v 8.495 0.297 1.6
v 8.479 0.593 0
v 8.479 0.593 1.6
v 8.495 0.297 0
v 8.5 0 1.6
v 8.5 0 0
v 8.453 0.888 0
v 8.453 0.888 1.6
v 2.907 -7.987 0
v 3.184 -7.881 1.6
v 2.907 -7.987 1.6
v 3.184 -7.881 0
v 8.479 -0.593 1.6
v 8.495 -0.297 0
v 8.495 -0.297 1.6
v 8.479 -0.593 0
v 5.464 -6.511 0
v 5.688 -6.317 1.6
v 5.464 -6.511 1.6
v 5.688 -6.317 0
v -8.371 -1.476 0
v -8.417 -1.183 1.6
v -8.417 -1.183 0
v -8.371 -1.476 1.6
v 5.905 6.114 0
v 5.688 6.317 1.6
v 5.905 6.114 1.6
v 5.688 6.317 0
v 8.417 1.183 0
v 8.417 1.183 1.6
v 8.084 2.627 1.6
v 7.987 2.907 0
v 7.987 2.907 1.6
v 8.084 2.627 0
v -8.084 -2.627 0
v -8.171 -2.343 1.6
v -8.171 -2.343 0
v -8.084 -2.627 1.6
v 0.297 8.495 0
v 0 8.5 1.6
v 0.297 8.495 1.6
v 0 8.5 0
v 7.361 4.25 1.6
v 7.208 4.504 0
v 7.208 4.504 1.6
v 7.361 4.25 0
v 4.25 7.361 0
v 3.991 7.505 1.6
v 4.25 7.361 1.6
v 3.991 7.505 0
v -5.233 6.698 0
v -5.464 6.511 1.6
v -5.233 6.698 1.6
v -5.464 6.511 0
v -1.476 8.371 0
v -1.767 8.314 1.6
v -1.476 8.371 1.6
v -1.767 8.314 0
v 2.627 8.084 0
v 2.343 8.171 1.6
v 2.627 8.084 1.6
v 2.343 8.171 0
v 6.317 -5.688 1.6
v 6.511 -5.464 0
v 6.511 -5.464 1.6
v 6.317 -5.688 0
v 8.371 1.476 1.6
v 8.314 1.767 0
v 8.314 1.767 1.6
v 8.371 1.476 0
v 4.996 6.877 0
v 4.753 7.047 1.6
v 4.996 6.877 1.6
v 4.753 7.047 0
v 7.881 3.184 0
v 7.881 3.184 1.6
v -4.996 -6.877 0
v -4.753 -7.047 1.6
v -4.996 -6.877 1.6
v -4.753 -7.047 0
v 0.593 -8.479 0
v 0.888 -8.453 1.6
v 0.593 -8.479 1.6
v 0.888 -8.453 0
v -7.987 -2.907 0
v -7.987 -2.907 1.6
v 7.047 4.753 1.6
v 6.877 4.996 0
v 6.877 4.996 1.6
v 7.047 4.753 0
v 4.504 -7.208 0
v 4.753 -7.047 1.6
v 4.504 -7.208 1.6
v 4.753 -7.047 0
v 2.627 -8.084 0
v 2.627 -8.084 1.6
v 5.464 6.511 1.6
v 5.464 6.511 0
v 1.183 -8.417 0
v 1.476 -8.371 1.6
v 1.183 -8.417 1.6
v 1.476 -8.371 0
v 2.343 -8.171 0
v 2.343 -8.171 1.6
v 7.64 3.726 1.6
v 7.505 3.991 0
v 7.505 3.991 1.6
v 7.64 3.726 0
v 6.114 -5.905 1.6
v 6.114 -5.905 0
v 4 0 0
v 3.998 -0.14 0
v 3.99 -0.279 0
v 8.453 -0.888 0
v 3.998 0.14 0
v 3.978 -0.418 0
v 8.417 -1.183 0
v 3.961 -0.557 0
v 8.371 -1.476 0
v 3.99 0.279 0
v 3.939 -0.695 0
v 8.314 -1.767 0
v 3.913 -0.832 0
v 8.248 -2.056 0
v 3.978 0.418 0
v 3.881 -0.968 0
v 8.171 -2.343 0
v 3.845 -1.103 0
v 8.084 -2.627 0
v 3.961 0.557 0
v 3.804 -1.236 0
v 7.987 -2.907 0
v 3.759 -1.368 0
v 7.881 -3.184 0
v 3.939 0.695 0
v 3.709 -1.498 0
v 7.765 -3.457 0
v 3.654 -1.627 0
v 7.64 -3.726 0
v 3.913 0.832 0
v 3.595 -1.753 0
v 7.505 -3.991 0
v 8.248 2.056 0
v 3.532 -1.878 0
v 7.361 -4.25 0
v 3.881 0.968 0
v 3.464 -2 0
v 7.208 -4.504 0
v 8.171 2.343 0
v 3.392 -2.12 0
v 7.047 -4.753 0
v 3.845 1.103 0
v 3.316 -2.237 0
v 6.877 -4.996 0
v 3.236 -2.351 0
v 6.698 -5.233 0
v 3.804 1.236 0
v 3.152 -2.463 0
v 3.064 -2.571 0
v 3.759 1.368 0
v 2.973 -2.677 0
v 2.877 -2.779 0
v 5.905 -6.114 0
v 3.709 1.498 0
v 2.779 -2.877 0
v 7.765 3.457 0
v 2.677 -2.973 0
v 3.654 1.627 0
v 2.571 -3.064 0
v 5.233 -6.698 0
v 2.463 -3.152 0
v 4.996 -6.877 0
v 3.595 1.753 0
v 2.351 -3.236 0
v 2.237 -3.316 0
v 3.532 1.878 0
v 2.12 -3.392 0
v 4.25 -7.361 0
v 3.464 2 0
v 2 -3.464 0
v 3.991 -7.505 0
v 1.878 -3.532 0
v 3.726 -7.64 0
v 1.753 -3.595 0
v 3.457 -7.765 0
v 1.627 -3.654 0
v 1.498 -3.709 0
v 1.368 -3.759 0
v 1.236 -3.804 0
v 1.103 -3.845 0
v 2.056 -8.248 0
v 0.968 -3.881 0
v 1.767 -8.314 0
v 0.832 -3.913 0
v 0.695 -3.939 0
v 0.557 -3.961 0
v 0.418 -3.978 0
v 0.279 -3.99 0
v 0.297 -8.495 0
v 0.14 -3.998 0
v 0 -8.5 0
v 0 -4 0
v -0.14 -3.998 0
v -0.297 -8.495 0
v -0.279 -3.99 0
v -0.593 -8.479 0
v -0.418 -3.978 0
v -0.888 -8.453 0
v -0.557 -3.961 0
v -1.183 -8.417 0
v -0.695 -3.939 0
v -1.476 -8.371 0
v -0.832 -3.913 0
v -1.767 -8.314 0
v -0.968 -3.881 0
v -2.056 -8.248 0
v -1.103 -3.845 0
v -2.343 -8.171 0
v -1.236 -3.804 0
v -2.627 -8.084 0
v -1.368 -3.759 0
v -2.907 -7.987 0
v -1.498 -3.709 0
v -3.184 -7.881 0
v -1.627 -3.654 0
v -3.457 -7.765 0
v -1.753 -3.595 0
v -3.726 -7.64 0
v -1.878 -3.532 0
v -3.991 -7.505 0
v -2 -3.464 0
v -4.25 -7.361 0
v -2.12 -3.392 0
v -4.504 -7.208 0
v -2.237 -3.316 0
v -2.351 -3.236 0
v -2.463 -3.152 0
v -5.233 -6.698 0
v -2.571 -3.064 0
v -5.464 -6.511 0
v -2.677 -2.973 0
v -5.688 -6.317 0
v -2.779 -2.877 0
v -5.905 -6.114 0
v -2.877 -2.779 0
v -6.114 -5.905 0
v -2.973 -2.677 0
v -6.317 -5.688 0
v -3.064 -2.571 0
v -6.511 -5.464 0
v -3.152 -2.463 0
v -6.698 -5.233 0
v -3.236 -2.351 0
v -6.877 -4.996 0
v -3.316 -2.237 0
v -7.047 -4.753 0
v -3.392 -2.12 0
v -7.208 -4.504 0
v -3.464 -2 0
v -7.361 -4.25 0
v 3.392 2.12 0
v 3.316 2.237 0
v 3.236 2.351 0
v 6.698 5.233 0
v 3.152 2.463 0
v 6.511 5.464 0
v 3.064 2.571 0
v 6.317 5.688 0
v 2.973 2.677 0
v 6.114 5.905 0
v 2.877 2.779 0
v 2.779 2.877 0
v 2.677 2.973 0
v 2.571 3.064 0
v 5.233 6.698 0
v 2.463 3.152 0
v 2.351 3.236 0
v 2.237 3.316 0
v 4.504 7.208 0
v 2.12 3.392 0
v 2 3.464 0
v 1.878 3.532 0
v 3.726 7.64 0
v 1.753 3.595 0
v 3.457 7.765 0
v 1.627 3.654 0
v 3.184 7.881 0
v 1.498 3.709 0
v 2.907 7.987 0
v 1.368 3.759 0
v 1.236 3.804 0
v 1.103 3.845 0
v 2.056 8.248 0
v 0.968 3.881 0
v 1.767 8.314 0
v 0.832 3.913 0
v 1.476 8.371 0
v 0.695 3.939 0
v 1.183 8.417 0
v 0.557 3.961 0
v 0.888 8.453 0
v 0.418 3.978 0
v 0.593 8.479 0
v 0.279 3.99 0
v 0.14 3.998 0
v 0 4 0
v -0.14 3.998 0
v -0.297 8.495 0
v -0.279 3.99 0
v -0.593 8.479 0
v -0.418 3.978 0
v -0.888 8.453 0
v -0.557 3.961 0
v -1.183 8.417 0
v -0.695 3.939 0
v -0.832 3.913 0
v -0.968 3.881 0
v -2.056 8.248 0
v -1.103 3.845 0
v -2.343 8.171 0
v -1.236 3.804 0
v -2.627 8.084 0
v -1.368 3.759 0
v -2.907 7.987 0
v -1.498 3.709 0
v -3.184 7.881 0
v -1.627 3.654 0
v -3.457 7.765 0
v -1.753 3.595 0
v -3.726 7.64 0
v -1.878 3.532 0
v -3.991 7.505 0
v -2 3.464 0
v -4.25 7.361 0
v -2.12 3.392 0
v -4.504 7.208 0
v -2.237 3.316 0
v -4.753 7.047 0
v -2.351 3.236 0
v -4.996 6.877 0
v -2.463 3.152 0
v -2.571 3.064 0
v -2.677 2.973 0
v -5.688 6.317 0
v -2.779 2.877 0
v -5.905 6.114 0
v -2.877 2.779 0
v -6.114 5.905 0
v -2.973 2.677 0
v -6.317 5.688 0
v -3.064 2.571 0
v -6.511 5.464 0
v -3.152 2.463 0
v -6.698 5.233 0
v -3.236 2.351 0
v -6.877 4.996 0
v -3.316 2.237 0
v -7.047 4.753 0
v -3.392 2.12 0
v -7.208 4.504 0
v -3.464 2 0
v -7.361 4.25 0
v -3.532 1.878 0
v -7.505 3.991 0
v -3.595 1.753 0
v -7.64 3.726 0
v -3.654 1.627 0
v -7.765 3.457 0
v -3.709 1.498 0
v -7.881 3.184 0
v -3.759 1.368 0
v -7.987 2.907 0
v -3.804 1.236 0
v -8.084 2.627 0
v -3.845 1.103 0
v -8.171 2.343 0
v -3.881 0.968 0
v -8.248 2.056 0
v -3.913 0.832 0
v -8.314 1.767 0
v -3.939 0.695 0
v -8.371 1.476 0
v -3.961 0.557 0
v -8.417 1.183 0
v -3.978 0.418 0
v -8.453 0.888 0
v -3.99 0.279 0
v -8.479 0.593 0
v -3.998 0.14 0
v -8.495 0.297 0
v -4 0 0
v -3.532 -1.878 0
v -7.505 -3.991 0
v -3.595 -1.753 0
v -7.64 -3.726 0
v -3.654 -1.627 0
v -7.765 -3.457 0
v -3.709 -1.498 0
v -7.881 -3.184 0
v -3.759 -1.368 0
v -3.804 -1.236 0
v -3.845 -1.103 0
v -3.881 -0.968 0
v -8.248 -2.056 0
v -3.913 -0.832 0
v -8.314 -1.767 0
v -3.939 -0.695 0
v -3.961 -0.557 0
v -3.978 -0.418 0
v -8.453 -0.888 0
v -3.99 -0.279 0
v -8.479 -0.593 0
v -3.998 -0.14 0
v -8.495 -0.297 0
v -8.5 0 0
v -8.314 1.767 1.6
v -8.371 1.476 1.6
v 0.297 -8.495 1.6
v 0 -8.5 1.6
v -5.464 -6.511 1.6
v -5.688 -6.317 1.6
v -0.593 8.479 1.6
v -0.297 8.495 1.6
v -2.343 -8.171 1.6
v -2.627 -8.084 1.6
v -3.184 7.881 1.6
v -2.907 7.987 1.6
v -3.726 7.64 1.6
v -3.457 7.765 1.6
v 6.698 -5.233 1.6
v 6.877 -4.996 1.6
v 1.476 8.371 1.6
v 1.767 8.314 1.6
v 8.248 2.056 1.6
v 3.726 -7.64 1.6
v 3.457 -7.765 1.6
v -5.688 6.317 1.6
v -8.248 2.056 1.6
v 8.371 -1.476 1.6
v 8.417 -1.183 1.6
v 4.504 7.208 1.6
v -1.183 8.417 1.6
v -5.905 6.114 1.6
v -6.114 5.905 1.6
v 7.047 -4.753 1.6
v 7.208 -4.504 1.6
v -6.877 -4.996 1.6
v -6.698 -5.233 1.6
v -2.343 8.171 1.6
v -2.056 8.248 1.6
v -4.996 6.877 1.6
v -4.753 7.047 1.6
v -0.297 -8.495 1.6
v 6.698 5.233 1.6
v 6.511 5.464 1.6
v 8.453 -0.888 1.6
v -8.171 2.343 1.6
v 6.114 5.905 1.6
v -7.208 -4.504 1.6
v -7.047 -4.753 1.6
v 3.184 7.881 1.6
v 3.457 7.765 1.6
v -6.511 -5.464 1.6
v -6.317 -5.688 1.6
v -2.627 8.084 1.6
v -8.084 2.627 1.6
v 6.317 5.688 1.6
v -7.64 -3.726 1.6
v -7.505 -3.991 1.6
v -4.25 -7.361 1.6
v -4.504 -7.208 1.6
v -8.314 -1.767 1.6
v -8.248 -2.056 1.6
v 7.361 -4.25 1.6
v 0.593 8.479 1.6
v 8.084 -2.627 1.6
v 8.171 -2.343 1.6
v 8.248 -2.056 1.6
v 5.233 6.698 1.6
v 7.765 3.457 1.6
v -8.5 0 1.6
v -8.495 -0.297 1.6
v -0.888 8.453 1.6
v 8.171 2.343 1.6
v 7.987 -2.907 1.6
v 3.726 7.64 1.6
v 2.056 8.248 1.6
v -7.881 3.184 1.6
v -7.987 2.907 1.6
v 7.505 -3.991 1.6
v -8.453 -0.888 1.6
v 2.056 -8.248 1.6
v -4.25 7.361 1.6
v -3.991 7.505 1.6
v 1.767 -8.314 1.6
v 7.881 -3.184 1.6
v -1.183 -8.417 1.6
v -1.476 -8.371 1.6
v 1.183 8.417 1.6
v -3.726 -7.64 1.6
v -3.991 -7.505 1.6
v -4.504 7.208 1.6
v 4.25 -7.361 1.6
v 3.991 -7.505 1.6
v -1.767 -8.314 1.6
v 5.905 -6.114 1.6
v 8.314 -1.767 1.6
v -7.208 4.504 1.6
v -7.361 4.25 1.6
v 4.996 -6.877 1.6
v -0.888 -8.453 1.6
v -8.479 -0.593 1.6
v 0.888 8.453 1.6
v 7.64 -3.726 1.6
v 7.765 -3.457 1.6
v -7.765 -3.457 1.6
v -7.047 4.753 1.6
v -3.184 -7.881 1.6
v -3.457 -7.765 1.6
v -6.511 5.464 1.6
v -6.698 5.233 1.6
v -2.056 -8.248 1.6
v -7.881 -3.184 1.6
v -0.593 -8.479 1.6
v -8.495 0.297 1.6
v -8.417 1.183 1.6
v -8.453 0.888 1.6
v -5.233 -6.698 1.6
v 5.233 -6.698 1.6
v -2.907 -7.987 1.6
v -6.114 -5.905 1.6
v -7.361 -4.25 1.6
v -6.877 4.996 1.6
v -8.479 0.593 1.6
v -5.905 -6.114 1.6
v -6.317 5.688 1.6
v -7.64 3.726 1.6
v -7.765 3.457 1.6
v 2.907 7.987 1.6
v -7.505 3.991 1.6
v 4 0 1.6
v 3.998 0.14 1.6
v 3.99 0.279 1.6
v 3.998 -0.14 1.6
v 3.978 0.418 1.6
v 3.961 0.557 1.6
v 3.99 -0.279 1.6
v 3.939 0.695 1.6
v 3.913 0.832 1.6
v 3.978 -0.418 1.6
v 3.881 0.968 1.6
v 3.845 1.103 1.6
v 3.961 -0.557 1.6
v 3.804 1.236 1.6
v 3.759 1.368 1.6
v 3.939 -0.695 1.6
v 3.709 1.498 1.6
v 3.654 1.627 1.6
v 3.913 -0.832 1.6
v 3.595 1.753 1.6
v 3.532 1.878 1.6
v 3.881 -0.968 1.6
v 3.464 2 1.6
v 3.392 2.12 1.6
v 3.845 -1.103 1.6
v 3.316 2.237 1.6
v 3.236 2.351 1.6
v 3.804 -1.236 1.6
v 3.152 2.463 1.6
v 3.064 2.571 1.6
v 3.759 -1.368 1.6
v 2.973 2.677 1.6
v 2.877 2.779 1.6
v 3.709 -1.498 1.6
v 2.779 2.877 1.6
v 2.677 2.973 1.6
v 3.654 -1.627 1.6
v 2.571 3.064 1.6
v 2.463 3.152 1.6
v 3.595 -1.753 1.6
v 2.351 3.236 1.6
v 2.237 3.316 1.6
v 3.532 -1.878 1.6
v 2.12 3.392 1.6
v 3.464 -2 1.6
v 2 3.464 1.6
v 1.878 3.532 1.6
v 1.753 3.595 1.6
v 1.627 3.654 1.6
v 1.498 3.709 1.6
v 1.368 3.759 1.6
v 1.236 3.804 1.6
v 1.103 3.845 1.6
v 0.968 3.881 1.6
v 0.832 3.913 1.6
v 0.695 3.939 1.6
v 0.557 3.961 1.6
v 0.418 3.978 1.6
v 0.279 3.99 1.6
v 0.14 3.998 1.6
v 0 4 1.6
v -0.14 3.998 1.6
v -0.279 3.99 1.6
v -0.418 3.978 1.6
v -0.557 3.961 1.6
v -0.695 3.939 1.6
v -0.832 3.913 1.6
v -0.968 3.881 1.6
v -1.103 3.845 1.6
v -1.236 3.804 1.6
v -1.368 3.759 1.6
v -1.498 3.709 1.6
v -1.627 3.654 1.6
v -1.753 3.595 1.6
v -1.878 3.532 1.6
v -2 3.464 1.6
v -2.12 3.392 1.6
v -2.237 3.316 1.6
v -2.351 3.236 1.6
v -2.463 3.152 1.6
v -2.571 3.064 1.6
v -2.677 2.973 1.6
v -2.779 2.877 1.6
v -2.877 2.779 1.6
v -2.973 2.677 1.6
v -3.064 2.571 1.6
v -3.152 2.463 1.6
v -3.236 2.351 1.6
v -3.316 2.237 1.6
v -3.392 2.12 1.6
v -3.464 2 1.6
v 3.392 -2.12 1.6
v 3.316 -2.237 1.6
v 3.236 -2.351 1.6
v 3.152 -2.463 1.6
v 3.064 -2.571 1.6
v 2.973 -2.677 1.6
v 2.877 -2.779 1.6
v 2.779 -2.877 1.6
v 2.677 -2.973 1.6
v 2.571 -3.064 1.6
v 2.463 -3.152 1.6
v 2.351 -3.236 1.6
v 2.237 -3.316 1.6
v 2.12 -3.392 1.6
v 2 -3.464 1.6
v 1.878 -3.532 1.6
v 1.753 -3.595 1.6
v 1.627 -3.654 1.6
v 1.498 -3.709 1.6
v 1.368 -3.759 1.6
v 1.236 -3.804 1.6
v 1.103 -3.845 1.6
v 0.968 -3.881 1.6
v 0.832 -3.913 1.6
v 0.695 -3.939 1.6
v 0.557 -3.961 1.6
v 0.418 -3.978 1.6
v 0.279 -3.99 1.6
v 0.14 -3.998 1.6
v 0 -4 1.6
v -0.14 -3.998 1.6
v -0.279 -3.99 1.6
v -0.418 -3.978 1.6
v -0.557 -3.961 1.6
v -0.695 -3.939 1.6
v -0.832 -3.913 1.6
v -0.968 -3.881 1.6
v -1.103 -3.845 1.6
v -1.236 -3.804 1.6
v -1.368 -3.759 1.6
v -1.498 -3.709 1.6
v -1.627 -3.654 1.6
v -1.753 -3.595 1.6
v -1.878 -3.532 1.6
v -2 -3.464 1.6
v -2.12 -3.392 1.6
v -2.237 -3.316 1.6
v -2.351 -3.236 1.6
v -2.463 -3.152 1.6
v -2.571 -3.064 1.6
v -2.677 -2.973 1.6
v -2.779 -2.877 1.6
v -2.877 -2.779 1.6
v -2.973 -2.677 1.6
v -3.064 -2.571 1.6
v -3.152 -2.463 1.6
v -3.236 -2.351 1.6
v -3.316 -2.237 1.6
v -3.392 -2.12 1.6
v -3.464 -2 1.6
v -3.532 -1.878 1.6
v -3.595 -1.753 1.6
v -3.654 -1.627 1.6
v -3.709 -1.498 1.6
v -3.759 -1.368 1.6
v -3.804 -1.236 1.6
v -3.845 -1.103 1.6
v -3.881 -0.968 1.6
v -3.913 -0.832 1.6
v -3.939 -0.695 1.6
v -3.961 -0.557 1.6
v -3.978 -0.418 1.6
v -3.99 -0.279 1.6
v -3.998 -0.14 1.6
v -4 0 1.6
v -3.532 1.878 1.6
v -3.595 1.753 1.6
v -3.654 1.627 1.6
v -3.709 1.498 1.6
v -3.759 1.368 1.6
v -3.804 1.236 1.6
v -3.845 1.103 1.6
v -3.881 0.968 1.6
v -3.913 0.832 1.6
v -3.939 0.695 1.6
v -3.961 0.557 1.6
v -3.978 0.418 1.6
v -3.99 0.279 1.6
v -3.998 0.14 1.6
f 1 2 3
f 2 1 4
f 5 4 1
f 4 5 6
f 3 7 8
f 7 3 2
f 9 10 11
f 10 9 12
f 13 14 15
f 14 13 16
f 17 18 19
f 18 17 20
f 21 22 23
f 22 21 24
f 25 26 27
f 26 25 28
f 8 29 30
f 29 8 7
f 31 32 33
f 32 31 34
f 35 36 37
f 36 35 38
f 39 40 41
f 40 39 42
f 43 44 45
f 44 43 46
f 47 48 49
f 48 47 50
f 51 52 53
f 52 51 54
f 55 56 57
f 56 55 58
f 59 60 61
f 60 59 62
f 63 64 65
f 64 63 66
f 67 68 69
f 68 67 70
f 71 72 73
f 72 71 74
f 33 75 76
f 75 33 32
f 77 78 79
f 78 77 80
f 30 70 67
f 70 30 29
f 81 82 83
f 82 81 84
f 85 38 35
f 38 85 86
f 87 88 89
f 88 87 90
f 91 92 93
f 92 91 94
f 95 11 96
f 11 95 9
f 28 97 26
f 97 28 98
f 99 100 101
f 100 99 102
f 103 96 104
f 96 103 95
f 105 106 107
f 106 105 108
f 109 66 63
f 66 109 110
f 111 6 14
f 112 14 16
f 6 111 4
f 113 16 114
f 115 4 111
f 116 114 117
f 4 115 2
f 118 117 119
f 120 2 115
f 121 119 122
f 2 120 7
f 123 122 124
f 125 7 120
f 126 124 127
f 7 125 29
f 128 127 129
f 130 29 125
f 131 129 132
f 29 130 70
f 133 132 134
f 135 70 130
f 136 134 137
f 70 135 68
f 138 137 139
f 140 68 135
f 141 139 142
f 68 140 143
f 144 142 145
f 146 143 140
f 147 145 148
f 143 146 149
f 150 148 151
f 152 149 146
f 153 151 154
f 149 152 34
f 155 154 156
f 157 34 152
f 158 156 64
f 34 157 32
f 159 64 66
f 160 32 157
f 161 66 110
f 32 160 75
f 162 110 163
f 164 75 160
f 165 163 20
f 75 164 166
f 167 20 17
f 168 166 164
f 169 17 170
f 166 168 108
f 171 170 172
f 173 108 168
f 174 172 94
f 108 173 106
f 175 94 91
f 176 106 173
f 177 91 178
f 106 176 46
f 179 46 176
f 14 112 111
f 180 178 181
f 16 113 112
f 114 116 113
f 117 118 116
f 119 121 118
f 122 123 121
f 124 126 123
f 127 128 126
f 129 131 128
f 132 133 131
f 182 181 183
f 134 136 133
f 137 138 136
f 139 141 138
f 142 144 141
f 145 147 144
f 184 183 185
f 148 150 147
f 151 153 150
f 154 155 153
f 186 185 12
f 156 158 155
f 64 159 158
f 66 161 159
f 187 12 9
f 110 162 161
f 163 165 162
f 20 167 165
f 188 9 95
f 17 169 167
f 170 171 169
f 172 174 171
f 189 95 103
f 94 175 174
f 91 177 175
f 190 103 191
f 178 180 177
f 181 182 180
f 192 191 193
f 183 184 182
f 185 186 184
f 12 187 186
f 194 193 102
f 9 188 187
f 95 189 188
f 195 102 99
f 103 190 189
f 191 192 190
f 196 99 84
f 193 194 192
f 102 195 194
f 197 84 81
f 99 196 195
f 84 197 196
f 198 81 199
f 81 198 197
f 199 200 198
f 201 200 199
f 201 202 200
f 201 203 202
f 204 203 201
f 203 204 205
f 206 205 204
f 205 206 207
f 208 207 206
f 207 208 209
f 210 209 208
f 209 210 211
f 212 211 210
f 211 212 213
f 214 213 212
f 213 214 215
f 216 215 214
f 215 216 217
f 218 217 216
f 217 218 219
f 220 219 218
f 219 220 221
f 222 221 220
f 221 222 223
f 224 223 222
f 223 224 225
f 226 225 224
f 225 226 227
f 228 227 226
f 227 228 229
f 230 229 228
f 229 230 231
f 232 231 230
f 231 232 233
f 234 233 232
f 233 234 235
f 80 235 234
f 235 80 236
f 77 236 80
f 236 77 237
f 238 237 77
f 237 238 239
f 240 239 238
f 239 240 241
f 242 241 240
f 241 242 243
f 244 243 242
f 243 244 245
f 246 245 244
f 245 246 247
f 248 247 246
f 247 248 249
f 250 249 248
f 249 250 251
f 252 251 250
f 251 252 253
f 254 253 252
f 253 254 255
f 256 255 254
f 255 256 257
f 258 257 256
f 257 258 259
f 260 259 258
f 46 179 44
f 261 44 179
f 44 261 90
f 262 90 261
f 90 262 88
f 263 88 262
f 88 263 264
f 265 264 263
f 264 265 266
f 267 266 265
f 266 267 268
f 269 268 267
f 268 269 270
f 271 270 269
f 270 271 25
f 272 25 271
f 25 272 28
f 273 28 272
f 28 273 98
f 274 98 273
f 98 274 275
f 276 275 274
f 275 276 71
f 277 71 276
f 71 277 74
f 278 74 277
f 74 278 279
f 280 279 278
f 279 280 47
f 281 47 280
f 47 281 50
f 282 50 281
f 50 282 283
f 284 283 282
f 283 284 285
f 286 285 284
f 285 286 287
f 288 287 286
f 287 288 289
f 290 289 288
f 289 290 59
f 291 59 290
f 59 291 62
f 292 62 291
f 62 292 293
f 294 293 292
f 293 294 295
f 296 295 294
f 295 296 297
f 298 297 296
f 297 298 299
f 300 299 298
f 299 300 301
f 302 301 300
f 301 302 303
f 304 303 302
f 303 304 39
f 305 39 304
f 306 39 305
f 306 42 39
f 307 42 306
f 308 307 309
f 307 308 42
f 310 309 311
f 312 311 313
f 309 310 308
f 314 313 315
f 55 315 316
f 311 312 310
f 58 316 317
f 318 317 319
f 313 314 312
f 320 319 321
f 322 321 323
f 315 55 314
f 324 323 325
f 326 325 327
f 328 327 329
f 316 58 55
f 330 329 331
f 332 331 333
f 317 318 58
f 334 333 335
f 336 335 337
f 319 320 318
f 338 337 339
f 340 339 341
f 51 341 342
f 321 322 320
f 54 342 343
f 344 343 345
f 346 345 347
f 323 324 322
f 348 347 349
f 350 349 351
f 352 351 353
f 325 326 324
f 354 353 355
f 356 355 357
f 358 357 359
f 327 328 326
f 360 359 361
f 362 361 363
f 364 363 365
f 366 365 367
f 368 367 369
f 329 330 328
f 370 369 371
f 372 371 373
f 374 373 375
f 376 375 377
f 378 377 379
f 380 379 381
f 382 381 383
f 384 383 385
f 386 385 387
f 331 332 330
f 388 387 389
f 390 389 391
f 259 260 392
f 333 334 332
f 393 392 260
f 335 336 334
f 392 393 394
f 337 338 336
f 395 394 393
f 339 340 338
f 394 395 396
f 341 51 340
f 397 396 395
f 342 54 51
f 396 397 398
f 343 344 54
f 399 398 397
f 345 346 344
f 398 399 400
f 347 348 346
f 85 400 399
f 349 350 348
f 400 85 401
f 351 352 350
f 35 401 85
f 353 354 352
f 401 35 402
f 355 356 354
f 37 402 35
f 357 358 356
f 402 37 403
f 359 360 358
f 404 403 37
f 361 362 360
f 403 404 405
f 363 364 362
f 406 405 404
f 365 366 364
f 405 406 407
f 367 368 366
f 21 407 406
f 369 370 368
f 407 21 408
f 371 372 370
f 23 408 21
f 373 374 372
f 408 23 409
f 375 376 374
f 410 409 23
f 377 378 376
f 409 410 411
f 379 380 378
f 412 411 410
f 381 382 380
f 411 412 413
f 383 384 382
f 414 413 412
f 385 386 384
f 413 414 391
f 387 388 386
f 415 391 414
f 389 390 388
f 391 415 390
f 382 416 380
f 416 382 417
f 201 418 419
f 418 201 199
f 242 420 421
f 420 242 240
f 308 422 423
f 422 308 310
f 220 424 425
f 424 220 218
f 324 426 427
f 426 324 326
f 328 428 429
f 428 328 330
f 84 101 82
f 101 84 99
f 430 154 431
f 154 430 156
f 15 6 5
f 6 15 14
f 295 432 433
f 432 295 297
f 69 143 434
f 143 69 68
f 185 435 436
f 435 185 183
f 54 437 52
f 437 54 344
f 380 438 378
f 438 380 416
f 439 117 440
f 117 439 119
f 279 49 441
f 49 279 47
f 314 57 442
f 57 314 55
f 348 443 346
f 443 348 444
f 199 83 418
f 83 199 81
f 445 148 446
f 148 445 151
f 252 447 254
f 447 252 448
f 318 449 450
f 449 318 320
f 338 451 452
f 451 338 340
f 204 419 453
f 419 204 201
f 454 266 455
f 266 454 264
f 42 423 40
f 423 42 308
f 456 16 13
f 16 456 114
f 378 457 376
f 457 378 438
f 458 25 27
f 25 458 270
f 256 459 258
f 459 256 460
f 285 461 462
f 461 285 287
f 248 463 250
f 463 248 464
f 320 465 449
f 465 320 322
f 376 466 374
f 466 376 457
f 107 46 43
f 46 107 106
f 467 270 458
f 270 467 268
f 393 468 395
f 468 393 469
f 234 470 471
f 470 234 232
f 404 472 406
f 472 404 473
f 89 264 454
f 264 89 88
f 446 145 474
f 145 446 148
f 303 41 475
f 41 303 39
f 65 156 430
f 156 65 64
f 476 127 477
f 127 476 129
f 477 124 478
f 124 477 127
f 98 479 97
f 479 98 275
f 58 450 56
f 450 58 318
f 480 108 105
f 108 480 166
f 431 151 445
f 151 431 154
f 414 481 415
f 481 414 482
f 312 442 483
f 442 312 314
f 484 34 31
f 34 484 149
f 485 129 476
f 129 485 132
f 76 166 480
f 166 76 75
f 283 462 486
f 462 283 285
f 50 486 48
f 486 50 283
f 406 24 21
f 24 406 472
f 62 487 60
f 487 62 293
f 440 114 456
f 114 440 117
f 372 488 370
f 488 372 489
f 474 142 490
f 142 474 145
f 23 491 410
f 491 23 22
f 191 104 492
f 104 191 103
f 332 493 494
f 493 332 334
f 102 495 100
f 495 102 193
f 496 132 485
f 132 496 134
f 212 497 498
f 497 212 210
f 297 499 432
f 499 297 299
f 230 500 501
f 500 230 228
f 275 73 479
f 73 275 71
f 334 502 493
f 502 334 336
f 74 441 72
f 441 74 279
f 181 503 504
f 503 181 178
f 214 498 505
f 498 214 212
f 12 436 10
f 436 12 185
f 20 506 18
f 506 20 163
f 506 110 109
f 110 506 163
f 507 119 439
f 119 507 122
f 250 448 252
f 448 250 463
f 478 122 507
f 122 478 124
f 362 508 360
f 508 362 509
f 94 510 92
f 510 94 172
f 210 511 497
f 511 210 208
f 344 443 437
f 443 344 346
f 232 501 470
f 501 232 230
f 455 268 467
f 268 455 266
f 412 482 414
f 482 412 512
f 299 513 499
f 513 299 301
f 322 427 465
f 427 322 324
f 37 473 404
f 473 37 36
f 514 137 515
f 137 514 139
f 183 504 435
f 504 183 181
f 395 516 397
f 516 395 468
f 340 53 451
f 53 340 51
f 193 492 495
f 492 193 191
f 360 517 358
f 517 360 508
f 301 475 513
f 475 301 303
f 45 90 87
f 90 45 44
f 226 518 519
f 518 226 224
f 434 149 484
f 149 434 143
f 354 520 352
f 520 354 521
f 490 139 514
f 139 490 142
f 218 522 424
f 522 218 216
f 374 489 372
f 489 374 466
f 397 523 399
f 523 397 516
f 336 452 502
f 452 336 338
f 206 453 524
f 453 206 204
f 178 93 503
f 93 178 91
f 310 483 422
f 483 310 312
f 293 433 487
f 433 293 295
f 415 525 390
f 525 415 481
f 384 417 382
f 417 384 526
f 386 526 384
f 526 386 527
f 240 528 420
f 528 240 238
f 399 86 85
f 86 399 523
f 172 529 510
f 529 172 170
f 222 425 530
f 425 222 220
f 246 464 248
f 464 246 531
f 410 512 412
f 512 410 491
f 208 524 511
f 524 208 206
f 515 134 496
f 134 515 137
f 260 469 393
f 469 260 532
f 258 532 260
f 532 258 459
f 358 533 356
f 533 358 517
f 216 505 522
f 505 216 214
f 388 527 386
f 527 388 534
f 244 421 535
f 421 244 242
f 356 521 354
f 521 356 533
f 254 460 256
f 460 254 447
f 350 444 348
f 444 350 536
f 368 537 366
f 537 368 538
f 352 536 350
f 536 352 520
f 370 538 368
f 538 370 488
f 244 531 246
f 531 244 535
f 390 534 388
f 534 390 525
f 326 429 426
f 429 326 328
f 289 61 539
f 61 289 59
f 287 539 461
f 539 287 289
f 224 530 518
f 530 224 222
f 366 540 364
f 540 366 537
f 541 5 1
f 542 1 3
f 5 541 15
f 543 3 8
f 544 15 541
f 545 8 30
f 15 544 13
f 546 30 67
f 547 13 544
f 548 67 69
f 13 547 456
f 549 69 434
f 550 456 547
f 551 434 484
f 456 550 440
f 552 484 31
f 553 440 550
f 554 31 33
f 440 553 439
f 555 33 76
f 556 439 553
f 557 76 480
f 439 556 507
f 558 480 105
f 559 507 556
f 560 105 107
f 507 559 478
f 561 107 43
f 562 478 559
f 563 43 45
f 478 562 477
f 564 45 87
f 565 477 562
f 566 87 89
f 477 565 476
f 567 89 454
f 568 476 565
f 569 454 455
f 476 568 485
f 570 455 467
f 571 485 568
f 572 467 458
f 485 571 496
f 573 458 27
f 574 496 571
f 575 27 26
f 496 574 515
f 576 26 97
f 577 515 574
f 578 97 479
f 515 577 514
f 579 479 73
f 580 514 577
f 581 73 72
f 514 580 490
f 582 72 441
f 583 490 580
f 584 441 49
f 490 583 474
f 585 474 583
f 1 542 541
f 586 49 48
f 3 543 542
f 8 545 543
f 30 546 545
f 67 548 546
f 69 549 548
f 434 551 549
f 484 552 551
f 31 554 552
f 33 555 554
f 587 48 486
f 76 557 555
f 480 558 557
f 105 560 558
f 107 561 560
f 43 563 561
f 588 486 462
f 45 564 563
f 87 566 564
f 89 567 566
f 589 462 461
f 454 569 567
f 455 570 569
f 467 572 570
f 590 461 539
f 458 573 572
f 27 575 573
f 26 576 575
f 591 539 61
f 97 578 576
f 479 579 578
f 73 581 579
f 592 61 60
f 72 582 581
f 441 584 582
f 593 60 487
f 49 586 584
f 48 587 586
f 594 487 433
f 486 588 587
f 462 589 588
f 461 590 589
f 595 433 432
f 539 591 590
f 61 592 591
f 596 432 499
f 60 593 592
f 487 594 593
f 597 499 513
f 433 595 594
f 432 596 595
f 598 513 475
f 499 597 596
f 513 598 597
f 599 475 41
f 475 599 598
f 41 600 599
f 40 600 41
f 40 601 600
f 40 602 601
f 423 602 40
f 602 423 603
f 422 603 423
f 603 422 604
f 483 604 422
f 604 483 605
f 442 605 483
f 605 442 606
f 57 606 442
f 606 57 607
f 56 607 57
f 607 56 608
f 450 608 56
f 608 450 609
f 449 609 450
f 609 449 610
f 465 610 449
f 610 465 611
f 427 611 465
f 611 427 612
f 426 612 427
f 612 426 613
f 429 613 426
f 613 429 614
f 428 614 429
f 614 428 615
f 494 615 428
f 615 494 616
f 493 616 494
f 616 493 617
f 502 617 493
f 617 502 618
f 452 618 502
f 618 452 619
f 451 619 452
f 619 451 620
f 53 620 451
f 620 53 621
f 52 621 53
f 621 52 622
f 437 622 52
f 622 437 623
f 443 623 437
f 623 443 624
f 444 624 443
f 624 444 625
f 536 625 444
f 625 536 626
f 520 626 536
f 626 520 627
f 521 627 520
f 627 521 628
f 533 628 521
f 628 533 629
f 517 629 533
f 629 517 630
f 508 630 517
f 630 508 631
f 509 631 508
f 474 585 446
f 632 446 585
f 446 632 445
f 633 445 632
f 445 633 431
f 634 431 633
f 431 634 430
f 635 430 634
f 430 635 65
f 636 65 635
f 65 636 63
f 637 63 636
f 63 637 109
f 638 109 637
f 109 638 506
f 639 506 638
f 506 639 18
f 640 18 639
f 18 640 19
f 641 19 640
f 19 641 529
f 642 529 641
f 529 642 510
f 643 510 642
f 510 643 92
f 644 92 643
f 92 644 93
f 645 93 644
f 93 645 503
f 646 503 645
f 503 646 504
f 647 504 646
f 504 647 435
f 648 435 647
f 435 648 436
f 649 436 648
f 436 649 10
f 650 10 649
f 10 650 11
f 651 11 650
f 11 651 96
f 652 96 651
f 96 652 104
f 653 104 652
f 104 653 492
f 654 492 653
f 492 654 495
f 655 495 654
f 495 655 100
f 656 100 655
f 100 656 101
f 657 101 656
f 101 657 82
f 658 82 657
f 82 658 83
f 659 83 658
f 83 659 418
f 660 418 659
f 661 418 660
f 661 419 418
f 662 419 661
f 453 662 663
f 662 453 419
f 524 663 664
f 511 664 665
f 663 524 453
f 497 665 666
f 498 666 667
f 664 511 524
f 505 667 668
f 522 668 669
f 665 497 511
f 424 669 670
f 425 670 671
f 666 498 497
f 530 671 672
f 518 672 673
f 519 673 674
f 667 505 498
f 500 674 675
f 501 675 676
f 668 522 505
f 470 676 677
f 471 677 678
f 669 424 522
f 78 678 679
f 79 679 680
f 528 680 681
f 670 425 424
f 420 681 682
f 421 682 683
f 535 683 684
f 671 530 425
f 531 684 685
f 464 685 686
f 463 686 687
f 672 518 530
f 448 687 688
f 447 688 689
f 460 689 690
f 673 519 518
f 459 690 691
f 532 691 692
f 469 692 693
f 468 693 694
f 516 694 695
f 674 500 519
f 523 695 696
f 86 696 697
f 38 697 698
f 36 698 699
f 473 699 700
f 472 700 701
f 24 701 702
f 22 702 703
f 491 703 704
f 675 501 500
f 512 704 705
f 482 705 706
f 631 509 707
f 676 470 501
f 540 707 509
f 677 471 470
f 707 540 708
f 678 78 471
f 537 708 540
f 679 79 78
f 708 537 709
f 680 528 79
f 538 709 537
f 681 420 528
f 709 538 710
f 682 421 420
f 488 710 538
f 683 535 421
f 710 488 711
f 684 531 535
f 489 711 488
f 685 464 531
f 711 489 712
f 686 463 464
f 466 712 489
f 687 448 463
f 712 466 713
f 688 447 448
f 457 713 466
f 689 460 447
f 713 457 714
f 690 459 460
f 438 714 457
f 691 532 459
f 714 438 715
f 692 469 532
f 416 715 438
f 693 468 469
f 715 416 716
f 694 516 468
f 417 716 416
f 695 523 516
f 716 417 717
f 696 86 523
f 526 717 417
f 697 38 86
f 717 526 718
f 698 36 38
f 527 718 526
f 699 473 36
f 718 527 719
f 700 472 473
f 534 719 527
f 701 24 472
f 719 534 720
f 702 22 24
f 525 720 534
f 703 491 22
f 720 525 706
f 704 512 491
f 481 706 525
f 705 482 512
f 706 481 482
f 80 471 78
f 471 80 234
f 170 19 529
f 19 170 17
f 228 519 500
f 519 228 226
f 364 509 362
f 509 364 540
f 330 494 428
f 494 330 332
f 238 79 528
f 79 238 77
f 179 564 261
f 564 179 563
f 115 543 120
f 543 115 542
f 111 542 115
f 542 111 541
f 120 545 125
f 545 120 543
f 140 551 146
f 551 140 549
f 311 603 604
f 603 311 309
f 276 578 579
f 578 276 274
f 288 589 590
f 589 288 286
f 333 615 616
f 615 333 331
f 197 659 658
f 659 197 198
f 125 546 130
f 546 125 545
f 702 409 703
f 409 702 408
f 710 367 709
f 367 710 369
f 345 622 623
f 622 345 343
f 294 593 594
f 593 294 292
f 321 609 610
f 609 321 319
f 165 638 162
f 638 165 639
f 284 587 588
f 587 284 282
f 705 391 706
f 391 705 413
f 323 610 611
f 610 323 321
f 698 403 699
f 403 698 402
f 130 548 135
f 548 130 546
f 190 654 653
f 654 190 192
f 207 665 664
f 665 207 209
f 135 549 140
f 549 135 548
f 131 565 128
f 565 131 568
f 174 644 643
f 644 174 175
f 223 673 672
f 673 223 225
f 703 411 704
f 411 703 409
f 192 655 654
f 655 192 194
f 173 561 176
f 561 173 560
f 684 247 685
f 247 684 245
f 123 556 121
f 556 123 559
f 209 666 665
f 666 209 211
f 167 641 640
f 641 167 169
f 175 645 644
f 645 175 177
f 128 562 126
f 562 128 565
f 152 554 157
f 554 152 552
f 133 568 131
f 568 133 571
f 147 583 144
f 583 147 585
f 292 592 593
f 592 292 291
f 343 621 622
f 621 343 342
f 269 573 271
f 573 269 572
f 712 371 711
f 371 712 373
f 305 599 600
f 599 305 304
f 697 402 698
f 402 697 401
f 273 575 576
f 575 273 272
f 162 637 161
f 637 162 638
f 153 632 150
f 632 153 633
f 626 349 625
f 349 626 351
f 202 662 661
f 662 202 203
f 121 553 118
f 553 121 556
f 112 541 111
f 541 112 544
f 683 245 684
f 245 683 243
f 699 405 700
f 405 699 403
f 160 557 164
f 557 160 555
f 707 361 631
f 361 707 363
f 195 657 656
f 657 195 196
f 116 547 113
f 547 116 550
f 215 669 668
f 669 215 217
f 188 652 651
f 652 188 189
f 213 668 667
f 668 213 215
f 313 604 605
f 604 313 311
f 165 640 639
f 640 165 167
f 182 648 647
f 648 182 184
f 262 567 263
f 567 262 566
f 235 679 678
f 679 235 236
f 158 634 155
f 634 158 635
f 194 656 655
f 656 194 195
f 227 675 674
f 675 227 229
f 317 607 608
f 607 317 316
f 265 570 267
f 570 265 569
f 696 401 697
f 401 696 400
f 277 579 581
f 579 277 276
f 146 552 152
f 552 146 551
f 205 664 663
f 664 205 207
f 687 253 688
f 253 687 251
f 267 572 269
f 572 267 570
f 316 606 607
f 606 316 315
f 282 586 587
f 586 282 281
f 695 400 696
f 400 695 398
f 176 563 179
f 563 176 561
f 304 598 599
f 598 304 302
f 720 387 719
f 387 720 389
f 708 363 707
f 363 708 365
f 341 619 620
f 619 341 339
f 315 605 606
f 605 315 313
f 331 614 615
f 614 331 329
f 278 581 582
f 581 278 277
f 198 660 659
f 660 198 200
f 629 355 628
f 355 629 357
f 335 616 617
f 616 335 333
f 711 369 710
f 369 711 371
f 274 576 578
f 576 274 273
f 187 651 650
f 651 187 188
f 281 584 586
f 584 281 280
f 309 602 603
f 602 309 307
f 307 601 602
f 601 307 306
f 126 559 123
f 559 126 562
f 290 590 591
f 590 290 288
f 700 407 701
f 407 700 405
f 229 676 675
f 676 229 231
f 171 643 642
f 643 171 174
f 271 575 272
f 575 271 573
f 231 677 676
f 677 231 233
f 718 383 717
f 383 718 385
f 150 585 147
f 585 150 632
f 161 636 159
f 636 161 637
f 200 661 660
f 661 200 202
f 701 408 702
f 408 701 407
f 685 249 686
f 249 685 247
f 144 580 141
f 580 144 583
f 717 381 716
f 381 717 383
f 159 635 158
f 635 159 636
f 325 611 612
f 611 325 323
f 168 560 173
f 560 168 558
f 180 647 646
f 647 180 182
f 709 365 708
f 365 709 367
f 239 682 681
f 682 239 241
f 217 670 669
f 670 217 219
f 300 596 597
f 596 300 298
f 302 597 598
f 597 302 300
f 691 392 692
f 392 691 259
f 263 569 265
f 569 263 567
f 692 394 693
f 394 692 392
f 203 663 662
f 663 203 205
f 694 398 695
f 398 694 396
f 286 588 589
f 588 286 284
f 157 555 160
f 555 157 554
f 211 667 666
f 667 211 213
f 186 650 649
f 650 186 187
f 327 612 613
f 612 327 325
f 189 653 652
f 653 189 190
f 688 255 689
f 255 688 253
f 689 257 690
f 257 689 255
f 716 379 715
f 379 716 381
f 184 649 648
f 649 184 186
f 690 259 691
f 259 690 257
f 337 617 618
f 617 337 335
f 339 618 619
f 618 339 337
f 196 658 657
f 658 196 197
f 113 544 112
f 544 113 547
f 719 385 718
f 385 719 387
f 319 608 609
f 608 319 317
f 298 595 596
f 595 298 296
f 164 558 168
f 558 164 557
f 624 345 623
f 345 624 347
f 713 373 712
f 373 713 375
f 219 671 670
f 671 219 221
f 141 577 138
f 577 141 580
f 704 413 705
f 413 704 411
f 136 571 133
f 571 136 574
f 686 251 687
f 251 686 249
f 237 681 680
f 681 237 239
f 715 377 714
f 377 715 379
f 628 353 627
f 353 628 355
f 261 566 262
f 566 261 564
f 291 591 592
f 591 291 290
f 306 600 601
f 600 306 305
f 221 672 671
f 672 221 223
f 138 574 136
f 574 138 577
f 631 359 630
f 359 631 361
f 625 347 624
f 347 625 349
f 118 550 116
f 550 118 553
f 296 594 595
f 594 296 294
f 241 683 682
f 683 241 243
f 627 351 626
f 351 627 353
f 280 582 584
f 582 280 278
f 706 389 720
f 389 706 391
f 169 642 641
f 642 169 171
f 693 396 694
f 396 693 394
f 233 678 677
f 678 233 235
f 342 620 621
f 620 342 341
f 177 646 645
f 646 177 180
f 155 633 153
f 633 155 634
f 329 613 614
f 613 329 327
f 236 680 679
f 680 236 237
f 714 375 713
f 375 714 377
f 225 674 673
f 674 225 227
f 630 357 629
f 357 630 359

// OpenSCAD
$fn = 180;

inner_d = 8.0;
outer_d = 17.0;
thickness = 1.6;

difference() {
  cylinder(h = thickness, d = outer_d);
  cylinder(h = thickness + 0.2, d = inner_d);
}
